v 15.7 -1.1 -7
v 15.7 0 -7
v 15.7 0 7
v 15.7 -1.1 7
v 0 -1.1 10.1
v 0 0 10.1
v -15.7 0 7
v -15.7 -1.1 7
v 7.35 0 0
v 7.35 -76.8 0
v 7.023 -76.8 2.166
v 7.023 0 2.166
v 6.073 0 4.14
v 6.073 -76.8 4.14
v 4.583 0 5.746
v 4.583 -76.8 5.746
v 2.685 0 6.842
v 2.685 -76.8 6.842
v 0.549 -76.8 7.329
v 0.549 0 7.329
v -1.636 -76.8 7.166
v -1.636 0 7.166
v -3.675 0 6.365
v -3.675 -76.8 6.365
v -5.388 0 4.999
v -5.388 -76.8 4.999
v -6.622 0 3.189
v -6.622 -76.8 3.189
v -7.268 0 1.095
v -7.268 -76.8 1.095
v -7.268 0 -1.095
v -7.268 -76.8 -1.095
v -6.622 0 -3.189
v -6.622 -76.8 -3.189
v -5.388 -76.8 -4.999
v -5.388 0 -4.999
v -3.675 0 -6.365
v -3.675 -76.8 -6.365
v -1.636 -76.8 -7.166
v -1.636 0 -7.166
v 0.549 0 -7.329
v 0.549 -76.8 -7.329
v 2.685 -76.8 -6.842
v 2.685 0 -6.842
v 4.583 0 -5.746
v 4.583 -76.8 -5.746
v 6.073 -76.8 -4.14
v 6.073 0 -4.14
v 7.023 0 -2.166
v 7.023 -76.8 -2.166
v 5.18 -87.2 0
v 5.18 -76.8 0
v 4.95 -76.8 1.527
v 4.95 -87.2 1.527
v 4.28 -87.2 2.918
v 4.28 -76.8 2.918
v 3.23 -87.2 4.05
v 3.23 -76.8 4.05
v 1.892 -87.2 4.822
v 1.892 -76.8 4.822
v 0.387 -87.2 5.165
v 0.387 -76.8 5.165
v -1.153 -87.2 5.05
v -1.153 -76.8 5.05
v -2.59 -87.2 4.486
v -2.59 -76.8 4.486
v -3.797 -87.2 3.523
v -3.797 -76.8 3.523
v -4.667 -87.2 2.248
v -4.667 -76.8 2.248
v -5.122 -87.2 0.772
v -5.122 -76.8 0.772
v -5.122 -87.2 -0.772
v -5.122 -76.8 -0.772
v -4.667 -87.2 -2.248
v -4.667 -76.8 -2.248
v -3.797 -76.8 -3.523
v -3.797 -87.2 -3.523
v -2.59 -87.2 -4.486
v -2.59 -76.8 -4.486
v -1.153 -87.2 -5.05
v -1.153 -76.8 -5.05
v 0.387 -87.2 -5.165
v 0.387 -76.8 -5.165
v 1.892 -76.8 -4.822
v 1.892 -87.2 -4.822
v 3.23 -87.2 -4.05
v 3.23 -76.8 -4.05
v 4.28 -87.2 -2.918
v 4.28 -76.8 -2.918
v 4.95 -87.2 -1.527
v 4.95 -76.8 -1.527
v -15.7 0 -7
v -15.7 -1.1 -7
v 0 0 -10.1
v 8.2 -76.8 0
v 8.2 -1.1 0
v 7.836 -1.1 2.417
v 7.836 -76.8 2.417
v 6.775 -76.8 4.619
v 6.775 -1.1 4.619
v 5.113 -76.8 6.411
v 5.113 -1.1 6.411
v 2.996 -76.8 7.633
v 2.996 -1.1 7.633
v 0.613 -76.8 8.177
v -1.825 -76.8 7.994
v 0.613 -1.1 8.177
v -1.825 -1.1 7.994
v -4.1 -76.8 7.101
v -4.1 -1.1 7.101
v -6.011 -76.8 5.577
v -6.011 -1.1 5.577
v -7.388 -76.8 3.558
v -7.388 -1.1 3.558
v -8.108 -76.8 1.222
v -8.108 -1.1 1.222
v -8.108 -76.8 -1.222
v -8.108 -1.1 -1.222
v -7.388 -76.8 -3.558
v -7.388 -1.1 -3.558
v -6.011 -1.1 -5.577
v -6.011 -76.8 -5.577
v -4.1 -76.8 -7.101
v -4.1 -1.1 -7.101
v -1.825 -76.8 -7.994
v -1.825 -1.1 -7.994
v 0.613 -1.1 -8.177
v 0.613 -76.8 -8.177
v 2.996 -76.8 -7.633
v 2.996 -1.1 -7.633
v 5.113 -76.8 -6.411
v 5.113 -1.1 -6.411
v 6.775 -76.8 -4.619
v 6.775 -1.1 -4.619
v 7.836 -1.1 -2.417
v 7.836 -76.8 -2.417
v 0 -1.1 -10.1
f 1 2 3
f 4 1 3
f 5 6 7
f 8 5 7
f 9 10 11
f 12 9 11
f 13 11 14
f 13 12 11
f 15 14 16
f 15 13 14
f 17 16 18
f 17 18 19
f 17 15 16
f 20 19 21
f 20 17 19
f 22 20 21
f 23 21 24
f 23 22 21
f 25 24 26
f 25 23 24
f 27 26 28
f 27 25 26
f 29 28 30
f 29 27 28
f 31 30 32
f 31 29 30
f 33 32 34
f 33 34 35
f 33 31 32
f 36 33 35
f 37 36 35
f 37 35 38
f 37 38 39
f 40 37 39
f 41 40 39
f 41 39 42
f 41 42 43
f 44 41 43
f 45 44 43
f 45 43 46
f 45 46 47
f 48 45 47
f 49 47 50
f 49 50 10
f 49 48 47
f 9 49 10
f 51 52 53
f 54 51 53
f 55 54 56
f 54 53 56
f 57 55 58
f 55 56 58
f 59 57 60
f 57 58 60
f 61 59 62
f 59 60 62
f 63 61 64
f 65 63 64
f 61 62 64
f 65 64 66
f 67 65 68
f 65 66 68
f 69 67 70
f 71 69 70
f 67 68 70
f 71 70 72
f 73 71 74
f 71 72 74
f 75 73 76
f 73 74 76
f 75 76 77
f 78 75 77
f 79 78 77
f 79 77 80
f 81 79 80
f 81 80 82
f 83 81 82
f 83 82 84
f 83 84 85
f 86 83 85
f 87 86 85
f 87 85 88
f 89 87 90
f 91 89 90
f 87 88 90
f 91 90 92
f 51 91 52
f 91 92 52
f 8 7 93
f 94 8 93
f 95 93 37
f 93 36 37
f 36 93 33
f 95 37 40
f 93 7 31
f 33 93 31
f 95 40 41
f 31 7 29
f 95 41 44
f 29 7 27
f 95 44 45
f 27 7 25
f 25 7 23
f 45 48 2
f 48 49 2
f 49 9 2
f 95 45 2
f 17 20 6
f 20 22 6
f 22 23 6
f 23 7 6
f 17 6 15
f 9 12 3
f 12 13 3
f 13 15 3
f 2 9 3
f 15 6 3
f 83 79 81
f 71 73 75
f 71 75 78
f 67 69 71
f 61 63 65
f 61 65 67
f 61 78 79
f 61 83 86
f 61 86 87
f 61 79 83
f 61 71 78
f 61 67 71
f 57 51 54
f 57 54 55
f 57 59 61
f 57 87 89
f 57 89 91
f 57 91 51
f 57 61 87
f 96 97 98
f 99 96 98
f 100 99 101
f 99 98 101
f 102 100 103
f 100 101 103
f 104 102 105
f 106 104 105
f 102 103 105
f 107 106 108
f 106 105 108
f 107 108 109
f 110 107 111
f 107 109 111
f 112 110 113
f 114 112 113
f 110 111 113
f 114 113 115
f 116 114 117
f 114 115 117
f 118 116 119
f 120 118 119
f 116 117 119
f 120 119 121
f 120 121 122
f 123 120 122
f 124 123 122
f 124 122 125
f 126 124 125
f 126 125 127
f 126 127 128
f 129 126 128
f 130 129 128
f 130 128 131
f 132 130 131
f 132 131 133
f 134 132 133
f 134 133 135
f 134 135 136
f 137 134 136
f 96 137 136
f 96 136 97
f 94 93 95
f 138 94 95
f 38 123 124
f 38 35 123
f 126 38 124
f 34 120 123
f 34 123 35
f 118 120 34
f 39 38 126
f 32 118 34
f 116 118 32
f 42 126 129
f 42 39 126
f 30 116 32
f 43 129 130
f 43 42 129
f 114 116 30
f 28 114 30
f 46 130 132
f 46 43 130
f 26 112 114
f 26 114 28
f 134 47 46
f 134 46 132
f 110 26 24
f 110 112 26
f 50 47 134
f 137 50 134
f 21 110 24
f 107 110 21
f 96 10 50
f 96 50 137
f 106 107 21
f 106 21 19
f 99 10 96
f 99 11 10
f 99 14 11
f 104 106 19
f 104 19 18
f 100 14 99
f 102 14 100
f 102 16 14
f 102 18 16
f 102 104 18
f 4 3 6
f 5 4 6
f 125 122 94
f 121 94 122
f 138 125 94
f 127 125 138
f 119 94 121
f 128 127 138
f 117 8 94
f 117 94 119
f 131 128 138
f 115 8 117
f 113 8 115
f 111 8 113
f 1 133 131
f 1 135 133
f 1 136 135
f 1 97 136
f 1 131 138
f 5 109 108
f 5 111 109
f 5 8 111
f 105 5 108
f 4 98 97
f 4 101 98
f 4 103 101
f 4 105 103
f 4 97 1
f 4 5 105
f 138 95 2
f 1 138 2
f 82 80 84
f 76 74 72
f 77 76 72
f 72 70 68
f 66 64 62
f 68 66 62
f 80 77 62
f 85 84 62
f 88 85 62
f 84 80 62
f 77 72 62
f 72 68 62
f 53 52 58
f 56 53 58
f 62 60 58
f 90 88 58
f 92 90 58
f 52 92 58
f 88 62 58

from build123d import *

# Parameters (mm, degrees)
F0_R     = 8.2
F0_R_2   = 7.35
F1_DEPTH = 76.8
F2_DEPTH = 1.1
F3_R     = 5.17997
F4_DEPTH = 10.4


with BuildPart() as f1:
    # F0 (on Front) → F1 (new body)
    with BuildSketch(Plane.XZ):
        Circle(F0_R)
        Circle(F0_R_2, mode=Mode.SUBTRACT)
    extrude(amount=F1_DEPTH)

    # F0 (on Front) → F2 (join)
    with BuildSketch(Plane.XZ):
        Polygon((15.7, 7), (0, 10.1), (-15.7, 7), (-15.7, -7), (0, -10.1), (15.7, -7), align=None)
        Circle(F0_R, mode=Mode.SUBTRACT)
    extrude(amount=F2_DEPTH)


with BuildPart() as f4:
    # F3 (on face) → F4 (new body)
    with BuildSketch(Plane.XZ.offset(76.8)):
        Circle(F3_R)
    extrude(amount=F4_DEPTH)


solid = Compound([f1.part, f4.part])
